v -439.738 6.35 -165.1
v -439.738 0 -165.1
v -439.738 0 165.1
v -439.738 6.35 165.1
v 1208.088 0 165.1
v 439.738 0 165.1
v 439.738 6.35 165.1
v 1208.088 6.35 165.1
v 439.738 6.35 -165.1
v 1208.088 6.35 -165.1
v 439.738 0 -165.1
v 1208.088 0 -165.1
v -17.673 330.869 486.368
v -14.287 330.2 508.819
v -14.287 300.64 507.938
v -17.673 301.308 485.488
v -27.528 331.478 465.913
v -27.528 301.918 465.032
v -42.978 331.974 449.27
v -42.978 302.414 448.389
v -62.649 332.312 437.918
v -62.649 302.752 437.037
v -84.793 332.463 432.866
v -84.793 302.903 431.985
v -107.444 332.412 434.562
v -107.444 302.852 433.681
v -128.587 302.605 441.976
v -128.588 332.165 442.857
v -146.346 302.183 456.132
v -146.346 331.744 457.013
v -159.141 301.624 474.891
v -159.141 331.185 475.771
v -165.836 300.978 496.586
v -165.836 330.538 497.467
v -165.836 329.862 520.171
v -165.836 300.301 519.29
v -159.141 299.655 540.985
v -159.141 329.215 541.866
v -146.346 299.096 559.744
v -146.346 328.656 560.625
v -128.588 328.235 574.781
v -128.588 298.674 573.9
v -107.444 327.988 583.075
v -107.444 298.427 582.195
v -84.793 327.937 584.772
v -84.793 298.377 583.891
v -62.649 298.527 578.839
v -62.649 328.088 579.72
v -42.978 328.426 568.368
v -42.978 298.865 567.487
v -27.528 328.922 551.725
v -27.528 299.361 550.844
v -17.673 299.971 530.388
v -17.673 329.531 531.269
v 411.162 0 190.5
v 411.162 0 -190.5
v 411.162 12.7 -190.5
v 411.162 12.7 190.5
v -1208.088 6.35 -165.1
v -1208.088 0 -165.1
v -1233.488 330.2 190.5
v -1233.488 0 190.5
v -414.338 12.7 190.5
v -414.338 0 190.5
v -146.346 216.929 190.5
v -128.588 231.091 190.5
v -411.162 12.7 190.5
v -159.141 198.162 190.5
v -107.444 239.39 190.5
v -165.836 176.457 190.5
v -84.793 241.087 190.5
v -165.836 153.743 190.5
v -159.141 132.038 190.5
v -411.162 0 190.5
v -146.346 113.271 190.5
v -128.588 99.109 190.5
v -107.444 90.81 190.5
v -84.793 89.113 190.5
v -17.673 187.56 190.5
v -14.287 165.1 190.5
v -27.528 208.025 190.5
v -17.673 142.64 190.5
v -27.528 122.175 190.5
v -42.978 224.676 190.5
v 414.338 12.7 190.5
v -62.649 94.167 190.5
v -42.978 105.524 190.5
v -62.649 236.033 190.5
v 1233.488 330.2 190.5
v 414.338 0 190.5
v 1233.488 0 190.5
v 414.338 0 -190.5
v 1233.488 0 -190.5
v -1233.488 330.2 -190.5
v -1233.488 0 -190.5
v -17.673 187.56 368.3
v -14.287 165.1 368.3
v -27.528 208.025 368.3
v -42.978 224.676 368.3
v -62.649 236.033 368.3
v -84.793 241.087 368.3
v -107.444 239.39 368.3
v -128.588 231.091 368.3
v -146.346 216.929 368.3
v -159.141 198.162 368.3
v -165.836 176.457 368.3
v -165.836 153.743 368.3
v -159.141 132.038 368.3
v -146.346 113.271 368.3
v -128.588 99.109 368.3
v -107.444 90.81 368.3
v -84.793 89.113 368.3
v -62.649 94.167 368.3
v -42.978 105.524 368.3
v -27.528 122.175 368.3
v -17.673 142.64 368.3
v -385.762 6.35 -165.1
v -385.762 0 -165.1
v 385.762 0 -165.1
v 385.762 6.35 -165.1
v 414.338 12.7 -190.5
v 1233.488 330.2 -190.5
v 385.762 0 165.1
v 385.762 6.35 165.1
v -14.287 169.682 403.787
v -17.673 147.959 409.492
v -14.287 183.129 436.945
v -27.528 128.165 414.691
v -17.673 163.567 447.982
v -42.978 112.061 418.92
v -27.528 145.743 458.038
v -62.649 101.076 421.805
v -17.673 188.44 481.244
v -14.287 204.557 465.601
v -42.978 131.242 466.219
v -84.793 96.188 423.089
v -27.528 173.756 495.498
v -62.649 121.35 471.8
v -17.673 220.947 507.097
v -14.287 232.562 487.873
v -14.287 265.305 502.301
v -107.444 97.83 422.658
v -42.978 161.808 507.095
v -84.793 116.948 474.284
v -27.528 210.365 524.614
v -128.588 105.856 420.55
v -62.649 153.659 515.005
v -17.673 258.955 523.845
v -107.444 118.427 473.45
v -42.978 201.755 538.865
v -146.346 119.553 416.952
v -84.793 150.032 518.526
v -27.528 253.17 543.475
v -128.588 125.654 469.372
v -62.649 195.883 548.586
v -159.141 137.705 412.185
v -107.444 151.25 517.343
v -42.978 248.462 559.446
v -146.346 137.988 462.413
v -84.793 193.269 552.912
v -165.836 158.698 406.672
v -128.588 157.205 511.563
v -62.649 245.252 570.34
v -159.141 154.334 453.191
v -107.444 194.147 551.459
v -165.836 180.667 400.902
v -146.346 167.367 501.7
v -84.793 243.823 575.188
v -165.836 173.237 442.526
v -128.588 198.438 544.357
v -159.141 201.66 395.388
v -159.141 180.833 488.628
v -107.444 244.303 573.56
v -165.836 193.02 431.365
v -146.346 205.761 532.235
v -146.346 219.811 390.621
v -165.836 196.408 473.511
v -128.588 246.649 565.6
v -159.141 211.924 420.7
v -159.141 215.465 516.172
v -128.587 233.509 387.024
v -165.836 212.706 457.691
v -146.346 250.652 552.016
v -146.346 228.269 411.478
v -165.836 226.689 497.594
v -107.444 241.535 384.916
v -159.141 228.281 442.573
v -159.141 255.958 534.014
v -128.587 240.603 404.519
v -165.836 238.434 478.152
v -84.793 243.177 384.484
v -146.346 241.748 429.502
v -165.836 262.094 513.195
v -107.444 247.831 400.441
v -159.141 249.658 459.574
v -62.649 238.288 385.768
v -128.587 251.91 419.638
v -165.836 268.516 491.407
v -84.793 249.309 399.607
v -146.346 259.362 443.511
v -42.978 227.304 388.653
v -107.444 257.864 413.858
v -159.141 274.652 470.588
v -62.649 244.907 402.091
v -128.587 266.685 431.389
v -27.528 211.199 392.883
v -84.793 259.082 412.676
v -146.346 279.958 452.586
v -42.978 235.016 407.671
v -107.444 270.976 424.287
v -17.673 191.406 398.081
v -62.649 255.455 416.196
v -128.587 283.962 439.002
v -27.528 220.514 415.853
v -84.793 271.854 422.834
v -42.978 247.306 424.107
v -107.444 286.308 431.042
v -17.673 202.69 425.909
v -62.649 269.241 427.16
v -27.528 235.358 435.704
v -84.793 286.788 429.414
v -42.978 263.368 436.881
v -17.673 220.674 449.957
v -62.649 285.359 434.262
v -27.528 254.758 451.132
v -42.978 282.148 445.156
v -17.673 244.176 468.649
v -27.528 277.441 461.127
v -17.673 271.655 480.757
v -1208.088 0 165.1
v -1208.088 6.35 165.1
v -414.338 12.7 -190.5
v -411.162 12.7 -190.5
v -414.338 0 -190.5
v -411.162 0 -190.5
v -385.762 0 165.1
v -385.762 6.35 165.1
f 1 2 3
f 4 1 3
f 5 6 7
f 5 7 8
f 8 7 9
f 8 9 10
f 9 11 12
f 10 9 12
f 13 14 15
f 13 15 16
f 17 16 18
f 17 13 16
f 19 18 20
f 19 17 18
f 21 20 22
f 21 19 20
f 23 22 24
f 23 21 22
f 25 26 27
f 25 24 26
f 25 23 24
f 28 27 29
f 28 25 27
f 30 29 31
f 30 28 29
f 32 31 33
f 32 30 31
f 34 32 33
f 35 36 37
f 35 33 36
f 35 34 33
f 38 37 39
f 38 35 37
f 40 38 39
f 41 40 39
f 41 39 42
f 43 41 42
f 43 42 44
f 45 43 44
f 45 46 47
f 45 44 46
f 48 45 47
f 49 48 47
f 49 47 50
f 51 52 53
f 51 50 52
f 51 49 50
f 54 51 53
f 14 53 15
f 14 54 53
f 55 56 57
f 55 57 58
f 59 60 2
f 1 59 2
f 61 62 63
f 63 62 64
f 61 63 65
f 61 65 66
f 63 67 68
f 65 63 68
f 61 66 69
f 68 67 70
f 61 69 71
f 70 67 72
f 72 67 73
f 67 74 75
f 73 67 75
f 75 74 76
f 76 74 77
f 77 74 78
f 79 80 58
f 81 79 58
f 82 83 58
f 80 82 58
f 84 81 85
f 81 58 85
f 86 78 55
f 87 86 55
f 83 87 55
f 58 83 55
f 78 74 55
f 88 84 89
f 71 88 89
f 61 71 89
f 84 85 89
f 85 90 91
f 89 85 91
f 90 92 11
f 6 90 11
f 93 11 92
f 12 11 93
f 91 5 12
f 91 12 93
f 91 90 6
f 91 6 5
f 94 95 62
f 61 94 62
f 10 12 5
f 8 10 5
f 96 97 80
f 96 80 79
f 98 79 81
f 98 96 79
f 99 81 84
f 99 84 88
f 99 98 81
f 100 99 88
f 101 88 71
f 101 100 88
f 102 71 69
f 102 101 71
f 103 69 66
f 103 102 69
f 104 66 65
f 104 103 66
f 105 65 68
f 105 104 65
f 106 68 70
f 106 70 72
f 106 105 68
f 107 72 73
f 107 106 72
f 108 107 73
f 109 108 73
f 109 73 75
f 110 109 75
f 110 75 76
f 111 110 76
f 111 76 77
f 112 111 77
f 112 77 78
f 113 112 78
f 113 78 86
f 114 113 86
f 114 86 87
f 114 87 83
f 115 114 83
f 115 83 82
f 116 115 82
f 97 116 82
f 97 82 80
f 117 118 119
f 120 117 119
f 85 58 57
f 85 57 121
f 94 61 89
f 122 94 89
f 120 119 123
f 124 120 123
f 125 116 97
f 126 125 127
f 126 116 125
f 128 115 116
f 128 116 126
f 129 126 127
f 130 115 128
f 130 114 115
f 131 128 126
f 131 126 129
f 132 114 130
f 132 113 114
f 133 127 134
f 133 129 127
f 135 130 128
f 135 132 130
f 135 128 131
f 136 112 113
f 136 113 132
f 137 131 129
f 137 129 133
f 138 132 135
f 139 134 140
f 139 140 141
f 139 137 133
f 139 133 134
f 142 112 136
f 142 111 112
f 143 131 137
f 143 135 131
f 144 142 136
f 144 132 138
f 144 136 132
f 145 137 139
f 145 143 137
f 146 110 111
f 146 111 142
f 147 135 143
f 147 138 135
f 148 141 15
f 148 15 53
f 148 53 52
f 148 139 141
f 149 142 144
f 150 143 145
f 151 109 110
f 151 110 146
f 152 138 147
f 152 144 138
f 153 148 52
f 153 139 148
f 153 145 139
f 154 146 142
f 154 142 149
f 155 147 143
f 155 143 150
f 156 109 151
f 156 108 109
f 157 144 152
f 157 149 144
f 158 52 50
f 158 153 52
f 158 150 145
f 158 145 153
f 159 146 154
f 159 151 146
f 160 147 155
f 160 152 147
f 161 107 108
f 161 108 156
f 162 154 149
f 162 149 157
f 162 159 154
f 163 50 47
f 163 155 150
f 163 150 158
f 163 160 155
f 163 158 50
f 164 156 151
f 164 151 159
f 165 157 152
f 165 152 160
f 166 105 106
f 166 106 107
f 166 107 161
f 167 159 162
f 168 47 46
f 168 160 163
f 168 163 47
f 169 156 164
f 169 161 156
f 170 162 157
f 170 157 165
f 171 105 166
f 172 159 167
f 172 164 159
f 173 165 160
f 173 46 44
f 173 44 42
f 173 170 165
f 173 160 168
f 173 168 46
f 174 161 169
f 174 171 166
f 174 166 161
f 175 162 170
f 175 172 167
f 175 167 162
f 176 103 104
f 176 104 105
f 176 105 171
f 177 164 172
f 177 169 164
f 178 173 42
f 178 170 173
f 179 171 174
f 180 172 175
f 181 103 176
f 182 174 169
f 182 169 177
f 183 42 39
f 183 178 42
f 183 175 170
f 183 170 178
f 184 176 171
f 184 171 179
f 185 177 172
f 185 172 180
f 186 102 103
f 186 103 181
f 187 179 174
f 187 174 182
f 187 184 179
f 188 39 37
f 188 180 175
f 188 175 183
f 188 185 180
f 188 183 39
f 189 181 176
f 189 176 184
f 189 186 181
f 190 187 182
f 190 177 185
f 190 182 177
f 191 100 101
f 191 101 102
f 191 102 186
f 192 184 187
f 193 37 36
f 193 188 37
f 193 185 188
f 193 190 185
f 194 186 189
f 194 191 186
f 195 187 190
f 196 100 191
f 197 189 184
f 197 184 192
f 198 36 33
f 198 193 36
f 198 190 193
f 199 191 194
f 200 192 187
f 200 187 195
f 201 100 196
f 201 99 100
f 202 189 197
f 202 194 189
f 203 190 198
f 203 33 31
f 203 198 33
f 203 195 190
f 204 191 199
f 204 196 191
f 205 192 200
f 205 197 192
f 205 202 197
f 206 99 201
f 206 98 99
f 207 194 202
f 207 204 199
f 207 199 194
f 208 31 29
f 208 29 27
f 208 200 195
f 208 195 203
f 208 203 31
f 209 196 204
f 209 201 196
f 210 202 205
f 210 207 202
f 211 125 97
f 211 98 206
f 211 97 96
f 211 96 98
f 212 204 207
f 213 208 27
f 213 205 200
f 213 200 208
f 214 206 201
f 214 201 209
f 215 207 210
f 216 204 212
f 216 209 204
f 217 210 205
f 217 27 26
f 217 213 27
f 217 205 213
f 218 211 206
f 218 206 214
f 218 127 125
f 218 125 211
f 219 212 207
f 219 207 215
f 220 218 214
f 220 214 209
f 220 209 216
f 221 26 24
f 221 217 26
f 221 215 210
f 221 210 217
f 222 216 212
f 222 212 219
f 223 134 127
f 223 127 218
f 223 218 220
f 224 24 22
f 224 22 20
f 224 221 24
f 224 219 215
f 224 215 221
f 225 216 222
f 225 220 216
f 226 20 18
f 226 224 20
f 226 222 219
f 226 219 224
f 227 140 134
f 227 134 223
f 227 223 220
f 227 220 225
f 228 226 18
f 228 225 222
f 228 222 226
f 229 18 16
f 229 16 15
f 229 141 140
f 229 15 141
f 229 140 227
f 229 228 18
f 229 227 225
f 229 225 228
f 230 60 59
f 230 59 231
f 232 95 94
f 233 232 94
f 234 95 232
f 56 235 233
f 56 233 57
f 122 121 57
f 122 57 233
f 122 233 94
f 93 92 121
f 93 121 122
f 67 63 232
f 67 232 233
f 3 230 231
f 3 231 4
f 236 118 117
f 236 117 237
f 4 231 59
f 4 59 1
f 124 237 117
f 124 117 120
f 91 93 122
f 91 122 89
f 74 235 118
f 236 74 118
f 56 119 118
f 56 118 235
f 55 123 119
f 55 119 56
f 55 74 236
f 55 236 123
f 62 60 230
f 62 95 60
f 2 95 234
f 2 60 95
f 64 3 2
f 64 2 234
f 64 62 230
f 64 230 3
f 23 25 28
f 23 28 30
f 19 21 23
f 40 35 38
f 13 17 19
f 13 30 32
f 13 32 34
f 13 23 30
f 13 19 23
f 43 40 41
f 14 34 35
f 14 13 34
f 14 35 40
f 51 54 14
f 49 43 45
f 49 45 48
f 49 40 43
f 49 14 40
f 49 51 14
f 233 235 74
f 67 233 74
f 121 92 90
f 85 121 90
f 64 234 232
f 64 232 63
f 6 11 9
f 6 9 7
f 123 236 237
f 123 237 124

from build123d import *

# Parameters (mm, degrees)
F0_W     = 2466.975
F0_H     = 381
F1_DEPTH = 330.2
F2_W     = 3.175
F2_H     = 381
F3_DEPTH = 12.7
F4_W     = 768.35
F4_H     = 330.2
F4_W_2   = 771.525
F5_DEPTH = 6.35
F6_R     = 76.2


with BuildPart() as f1:
    # F0 (on Front) → F1 (new body)
    with BuildSketch(Plane.XZ):
        Rectangle(F0_W, F0_H)
    extrude(amount=-F1_DEPTH)

    # F2 (on face) → F3 (cut)
    with BuildSketch(Plane.XZ):
        with Locations((-412.75, 0)):
            Rectangle(F2_W, F2_H)
        with Locations((412.75, 0)):
            Rectangle(F2_W, F2_H)
    extrude(amount=-F3_DEPTH, mode=Mode.SUBTRACT)

    # F4 (on face) → F5 (cut)
    with BuildSketch(Plane.XZ):
        with Locations((-823.9125, 0)):
            Rectangle(F4_W, F4_H)
        Rectangle(F4_W_2, F4_H)
        with Locations((823.9125, 0)):
            Rectangle(F4_W, F4_H)
    extrude(amount=-F5_DEPTH, mode=Mode.SUBTRACT)

    # F9: sweep along a path in F8
    with BuildLine(Plane(origin=(-90.4875, 0, 0), x_dir=(0, -1, 0), z_dir=(-1, 0, 0))) as f9_path:
        Line((-165.1, 190.5), (-165.1, 368.3))
        ThreePointArc((-165.1, 368.3), (-204.5570431921, 465.6007688069), (-300.6395792471, 507.9380352882))
        Line((-300.6395792471, 507.9380352882), (-330.2, 508.8187680178))
    # F6 (on face) → F9 (sweep)
    with BuildSketch(Plane.XY.offset(190.5)):
        with Locations((-90.4875, 165.1)):
            Circle(F6_R)
    sweep(path=f9_path.line)


solid = f1.part
